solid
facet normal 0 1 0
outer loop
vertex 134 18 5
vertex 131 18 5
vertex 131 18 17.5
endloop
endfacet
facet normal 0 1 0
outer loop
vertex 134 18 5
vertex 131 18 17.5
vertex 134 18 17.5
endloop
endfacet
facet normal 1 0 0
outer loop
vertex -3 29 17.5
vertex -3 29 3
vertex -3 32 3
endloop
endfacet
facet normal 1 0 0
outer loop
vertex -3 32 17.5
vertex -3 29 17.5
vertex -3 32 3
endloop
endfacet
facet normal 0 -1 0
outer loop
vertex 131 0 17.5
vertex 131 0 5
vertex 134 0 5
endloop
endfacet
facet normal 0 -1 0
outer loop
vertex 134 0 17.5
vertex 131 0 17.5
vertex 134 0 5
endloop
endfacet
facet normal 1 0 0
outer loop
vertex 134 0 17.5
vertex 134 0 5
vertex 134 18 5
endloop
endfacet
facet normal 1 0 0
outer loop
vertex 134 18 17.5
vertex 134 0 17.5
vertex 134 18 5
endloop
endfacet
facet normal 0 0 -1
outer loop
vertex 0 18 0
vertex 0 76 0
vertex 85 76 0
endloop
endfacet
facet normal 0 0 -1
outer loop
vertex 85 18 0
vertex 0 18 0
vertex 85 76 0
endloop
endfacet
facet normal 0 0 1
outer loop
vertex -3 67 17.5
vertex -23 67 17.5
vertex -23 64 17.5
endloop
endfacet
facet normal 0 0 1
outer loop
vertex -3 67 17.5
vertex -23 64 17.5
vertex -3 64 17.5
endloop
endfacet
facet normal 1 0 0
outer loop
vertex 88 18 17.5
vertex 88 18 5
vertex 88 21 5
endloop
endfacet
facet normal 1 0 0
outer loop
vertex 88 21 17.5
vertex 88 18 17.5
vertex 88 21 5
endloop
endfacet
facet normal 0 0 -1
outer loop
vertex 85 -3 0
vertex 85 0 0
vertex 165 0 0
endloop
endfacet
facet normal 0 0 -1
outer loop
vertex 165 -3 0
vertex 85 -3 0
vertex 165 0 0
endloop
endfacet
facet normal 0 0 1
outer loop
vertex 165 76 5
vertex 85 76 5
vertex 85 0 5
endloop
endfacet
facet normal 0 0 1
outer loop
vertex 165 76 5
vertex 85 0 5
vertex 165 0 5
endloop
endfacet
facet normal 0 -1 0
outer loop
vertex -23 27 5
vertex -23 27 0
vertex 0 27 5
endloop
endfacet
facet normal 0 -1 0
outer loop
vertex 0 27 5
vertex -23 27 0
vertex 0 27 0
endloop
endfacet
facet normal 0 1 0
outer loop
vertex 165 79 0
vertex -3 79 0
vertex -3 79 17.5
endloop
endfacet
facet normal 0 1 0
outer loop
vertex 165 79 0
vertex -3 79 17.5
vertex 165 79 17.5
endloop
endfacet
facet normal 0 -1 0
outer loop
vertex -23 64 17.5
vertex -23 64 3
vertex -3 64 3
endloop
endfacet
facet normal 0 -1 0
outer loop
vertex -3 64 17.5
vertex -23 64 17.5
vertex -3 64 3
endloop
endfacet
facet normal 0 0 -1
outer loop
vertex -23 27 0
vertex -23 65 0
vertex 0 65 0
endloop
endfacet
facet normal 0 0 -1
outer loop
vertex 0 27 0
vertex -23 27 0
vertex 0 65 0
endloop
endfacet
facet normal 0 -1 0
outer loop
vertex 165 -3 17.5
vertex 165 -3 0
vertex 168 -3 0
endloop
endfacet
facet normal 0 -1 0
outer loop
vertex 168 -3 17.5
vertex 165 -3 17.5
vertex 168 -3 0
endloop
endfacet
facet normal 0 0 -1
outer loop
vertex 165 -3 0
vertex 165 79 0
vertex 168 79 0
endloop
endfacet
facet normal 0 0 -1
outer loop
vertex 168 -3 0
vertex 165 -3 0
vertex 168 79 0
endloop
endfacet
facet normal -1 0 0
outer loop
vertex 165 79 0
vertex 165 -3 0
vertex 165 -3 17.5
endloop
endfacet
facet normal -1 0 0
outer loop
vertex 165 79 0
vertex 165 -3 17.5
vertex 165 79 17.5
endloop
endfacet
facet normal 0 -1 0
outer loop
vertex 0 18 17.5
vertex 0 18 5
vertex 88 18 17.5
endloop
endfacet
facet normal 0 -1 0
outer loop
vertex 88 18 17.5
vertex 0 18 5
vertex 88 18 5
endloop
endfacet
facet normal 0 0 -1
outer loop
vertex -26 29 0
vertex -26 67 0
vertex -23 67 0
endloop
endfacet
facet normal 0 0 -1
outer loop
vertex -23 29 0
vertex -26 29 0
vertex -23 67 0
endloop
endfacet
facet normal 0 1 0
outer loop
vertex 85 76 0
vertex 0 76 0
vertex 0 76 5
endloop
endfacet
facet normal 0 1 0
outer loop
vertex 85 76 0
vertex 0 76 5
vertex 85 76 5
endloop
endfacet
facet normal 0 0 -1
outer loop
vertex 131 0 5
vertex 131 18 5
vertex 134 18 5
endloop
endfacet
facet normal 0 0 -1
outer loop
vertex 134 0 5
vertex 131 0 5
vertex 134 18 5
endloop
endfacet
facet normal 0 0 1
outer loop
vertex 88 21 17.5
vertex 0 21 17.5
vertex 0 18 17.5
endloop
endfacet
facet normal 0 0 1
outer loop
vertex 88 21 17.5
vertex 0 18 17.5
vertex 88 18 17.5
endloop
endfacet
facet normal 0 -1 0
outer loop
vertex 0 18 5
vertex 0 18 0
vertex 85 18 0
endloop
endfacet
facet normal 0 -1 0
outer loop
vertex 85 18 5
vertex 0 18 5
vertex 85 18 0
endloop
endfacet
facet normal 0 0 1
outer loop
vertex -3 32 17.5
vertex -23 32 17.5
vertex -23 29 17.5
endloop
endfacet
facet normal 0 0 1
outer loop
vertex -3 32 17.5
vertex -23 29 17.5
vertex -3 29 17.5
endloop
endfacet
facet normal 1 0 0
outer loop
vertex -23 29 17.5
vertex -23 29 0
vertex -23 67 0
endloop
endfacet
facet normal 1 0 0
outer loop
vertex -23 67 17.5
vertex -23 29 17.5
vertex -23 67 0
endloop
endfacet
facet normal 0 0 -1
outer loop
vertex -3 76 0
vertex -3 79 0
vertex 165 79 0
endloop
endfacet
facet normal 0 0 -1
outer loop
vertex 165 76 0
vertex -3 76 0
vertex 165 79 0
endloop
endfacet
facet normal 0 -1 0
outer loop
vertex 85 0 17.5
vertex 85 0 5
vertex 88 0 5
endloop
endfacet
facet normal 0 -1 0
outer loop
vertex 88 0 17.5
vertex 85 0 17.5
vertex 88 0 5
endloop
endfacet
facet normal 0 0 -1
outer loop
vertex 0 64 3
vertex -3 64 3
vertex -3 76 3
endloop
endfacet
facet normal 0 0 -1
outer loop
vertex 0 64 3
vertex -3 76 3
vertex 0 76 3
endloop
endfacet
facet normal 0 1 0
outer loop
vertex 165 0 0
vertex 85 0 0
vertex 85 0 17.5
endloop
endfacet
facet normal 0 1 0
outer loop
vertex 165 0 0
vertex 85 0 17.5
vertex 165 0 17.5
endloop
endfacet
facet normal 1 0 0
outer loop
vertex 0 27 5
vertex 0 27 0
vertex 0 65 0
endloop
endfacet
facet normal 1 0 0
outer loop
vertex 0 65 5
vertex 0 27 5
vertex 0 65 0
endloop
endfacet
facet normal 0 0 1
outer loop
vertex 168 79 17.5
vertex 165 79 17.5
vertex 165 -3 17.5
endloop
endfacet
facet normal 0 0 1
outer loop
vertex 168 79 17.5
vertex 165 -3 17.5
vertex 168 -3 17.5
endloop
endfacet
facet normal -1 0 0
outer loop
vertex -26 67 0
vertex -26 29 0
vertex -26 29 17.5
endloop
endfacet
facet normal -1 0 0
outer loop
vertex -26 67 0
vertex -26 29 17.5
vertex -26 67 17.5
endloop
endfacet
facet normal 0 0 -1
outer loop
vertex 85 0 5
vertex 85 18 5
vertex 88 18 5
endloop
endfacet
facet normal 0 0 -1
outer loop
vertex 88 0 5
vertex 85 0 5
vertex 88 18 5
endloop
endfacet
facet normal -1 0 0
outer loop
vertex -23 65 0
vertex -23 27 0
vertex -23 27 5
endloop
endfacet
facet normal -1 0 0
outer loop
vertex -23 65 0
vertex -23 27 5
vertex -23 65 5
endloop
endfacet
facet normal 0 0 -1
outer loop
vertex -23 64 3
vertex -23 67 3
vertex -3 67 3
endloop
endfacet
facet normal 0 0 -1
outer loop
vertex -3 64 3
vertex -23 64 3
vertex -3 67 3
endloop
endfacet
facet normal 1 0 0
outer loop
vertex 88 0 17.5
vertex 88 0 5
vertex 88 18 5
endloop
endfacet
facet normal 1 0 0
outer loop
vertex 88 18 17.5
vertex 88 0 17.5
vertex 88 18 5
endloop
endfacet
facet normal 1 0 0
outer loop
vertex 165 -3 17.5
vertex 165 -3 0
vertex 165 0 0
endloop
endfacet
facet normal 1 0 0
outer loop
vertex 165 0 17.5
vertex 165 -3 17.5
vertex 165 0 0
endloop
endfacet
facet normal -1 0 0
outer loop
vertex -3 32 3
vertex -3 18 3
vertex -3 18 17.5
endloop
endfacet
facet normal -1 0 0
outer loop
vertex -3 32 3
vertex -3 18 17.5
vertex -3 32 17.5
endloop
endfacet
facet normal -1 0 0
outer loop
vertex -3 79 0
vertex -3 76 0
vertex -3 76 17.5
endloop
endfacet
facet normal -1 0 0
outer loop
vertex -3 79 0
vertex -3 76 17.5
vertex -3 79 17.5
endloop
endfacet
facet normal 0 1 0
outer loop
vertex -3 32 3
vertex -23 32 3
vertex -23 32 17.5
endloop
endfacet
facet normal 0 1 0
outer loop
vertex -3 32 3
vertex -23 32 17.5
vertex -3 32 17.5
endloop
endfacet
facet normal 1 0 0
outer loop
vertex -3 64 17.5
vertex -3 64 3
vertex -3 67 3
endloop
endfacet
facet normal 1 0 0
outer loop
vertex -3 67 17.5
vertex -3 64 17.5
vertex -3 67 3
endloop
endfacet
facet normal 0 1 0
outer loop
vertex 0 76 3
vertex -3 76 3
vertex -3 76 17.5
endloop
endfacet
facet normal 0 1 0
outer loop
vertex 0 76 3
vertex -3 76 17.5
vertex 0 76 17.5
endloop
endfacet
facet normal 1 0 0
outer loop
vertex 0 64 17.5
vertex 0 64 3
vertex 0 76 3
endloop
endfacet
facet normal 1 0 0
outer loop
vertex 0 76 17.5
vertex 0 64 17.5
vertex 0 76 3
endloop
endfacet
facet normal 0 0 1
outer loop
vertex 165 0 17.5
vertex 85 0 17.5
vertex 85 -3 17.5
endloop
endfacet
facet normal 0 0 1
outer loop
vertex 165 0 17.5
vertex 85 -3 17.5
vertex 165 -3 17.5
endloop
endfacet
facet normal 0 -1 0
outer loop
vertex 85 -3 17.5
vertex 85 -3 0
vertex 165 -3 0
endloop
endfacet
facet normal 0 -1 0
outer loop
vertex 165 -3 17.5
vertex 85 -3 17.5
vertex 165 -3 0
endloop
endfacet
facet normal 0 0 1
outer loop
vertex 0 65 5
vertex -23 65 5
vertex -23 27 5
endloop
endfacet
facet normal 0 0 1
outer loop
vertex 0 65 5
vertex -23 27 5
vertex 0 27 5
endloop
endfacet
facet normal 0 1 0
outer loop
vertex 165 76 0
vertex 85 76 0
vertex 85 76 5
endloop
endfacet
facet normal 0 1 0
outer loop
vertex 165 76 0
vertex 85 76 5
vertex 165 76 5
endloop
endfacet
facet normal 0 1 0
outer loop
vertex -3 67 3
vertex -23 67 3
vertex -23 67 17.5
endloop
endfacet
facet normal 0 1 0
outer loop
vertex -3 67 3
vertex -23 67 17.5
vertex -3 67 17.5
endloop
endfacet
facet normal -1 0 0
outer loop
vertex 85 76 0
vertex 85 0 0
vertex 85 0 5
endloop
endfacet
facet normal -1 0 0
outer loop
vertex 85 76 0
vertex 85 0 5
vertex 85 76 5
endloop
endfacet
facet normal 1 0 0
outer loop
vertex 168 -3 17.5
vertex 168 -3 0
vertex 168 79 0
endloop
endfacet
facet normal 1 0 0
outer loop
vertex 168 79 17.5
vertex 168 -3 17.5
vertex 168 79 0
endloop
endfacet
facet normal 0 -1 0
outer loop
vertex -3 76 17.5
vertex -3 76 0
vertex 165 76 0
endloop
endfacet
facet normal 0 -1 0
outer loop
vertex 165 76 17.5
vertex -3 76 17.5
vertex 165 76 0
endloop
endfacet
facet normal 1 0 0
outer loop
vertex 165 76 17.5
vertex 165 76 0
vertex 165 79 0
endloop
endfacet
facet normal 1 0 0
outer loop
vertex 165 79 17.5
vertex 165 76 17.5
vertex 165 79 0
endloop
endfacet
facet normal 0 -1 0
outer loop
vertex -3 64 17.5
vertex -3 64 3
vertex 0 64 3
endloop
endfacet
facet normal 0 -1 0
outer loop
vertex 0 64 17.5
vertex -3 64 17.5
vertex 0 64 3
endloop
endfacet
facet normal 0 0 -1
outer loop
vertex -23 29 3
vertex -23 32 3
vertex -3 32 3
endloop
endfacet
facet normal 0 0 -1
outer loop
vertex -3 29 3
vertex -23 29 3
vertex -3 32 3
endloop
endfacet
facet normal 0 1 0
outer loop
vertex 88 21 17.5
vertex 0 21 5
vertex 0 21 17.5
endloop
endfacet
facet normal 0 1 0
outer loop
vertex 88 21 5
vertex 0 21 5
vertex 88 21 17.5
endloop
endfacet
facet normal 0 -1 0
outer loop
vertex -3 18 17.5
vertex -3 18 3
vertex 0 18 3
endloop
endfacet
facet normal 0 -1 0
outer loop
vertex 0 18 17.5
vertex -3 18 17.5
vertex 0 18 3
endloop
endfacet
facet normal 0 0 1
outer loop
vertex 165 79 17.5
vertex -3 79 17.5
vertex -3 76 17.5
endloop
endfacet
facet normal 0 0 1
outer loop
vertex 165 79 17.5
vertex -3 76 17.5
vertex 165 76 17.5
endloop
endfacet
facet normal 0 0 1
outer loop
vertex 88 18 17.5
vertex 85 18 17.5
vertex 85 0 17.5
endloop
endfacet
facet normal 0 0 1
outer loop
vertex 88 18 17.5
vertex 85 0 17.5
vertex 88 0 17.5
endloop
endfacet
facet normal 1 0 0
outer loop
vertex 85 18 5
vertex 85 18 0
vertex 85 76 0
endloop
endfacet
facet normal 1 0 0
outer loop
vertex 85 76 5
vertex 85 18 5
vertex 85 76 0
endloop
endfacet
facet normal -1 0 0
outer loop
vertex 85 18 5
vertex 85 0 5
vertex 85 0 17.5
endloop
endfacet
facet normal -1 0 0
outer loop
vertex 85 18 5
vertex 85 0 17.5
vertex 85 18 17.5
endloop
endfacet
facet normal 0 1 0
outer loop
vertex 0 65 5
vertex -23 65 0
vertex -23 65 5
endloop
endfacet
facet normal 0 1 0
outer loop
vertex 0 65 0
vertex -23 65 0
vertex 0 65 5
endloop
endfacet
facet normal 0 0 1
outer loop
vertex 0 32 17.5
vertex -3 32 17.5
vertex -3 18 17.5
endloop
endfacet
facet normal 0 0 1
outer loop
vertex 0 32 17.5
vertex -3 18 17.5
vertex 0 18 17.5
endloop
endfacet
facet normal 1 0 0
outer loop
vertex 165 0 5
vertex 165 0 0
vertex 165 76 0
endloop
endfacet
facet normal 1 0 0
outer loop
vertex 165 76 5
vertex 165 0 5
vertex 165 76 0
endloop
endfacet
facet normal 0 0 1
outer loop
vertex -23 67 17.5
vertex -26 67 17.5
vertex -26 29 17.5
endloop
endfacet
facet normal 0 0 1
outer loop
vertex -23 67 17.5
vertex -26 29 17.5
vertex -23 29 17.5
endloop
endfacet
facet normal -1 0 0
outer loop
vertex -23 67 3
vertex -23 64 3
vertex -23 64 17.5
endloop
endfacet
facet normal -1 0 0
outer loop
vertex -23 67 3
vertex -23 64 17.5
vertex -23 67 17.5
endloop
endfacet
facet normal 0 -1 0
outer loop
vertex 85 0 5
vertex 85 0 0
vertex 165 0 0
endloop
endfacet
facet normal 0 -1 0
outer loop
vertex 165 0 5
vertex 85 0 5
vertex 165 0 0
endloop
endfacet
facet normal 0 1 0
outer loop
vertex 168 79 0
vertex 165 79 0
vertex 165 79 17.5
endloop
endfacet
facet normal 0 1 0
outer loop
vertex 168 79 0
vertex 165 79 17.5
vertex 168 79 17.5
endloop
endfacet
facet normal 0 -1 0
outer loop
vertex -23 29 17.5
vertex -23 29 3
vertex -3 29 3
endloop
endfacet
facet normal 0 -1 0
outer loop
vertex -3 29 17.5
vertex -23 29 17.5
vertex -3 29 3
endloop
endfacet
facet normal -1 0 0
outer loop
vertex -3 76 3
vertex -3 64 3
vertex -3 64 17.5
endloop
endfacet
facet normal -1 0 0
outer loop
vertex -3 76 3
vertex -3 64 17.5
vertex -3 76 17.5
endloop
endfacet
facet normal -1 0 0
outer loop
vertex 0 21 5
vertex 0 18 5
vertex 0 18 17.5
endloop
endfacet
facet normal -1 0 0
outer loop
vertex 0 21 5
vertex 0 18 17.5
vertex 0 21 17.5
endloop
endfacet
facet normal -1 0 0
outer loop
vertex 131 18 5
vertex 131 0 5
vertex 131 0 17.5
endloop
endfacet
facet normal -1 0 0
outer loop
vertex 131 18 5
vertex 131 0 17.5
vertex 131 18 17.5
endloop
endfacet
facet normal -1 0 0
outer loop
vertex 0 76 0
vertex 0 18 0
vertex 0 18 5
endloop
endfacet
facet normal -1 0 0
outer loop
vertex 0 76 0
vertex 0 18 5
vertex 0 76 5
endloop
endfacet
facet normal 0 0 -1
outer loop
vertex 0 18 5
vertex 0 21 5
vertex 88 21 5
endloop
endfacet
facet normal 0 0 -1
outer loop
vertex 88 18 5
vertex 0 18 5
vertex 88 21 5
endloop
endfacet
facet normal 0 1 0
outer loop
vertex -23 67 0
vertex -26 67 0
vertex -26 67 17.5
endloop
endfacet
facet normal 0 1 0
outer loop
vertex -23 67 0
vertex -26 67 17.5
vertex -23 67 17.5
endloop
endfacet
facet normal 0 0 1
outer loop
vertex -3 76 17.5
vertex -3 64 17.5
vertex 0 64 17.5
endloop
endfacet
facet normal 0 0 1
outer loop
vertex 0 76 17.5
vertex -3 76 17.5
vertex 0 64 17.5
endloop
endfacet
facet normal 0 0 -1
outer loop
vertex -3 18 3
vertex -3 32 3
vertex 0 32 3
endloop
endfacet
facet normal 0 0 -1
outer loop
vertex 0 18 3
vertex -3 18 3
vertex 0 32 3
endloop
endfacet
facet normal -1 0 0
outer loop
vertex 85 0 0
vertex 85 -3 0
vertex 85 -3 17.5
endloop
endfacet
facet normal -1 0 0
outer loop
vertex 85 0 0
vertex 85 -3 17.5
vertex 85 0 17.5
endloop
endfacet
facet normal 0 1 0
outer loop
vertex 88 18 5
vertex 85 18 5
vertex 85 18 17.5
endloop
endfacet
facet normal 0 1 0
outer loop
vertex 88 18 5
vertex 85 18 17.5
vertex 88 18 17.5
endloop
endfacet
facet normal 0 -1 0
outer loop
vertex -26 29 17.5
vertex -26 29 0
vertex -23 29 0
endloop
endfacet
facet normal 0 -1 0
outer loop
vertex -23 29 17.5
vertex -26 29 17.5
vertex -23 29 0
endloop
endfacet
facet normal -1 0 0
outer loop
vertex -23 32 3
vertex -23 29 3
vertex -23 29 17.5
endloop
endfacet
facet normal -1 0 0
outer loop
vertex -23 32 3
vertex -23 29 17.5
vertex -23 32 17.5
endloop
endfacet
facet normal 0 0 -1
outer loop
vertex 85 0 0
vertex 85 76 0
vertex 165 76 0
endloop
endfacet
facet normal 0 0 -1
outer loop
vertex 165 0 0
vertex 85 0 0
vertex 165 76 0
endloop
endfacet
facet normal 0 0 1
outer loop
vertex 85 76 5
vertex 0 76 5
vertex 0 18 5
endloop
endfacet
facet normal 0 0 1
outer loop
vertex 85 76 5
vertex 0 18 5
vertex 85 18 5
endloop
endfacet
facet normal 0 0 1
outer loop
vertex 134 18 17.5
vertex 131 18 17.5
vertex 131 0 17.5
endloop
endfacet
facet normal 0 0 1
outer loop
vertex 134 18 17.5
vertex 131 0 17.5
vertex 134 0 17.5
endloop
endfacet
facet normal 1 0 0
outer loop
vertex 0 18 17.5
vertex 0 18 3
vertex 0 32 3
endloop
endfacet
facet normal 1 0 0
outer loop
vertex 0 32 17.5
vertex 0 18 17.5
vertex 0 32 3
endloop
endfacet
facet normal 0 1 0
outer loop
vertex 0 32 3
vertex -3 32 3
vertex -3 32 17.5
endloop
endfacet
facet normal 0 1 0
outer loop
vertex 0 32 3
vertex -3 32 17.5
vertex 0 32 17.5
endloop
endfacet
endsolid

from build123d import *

# Parameters (mm, degrees)
BOX_W        = 85
BOX_H        = 58
BOX_DEPTH    = 5
BOX001_W     = 3
BOX001_H     = 18
BOX001_DEPTH = 12.5
BOX004_W     = 80
BOX004_H     = 3
BOX004_DEPTH = 17.5
BOX005_W     = 168
BOX005_H     = 3
BOX005_DEPTH = 17.5
BOX006_W     = 3
BOX006_H     = 14
BOX006_DEPTH = 14.5
BOX007_W     = 3
BOX007_H     = 12
BOX007_DEPTH = 14.5
BOX008_W     = 3
BOX008_H     = 82
BOX008_DEPTH = 17.5
BOX009_W     = 88
BOX009_H     = 3
BOX009_DEPTH = 12.5
BOX010_W     = 3
BOX010_H     = 18
BOX010_DEPTH = 12.5
BOX011_W     = 23
BOX011_H     = 38
BOX011_DEPTH = 5
BOX012_W     = 20
BOX012_H     = 3
BOX012_DEPTH = 14.5
BOX013_W     = 20
BOX013_H     = 3
BOX013_DEPTH = 14.5
BOX014_W     = 3
BOX014_H     = 38
BOX014_DEPTH = 17.5
BOX015_W     = 80
BOX015_H     = 76
BOX015_DEPTH = 5


with BuildPart() as base:
    # Box → Box (new body)
    with BuildSketch(Plane(origin=(0, 18, 0), x_dir=(1, 0, 0), z_dir=(0, 0, 1))):
        with Locations((42.5, 29)):
            Rectangle(BOX_W, BOX_H)
    extrude(amount=BOX_DEPTH)


with BuildPart() as platform_support:
    # Box001 → Box001 (new body)
    with BuildSketch(Plane(origin=(85, 0, 5), x_dir=(1, 0, 0), z_dir=(0, 0, 1))):
        with Locations((1.5, 9)):
            Rectangle(BOX001_W, BOX001_H)
    extrude(amount=BOX001_DEPTH)


with BuildPart() as box004:
    # Box004 → Box004 (new body)
    with BuildSketch(Plane(origin=(85, -3, 0), x_dir=(1, 0, 0), z_dir=(0, 0, 1))):
        with Locations((40, 1.5)):
            Rectangle(BOX004_W, BOX004_H)
    extrude(amount=BOX004_DEPTH)


with BuildPart() as box005:
    # Box005 → Box005 (new body)
    with BuildSketch(Plane(origin=(-3, 76, 0), x_dir=(1, 0, 0), z_dir=(0, 0, 1))):
        with Locations((84, 1.5)):
            Rectangle(BOX005_W, BOX005_H)
    extrude(amount=BOX005_DEPTH)


with BuildPart() as box006:
    # Box006 → Box006 (new body)
    with BuildSketch(Plane(origin=(-3, 18, 3), x_dir=(1, 0, 0), z_dir=(0, 0, 1))):
        with Locations((1.5, 7)):
            Rectangle(BOX006_W, BOX006_H)
    extrude(amount=BOX006_DEPTH)


with BuildPart() as box007:
    # Box007 → Box007 (new body)
    with BuildSketch(Plane(origin=(-3, 64, 3), x_dir=(1, 0, 0), z_dir=(0, 0, 1))):
        with Locations((1.5, 6)):
            Rectangle(BOX007_W, BOX007_H)
    extrude(amount=BOX007_DEPTH)


with BuildPart() as box008:
    # Box008 → Box008 (new body)
    with BuildSketch(Plane(origin=(165, -3, 0), x_dir=(1, 0, 0), z_dir=(0, 0, 1))):
        with Locations((1.5, 41)):
            Rectangle(BOX008_W, BOX008_H)
    extrude(amount=BOX008_DEPTH)


with BuildPart() as platform_support001:
    # Box009 → Box009 (new body)
    with BuildSketch(Plane(origin=(0, 18, 5), x_dir=(1, 0, 0), z_dir=(0, 0, 1))):
        with Locations((44, 1.5)):
            Rectangle(BOX009_W, BOX009_H)
    extrude(amount=BOX009_DEPTH)


with BuildPart() as platform_support002:
    # Box010 → Box010 (new body)
    with BuildSketch(Plane(origin=(131, 0, 5), x_dir=(1, 0, 0), z_dir=(0, 0, 1))):
        with Locations((1.5, 9)):
            Rectangle(BOX010_W, BOX010_H)
    extrude(amount=BOX010_DEPTH)


with BuildPart() as box011:
    # Box011 → Box011 (new body)
    with BuildSketch(Plane(origin=(-23, 27, 0), x_dir=(1, 0, 0), z_dir=(0, 0, 1))):
        with Locations((11.5, 19)):
            Rectangle(BOX011_W, BOX011_H)
    extrude(amount=BOX011_DEPTH)


with BuildPart() as box012:
    # Box012 → Box012 (new body)
    with BuildSketch(Plane(origin=(-23, 64, 3), x_dir=(1, 0, 0), z_dir=(0, 0, 1))):
        with Locations((10, 1.5)):
            Rectangle(BOX012_W, BOX012_H)
    extrude(amount=BOX012_DEPTH)


with BuildPart() as box013:
    # Box013 → Box013 (new body)
    with BuildSketch(Plane(origin=(-23, 29, 3), x_dir=(1, 0, 0), z_dir=(0, 0, 1))):
        with Locations((10, 1.5)):
            Rectangle(BOX013_W, BOX013_H)
    extrude(amount=BOX013_DEPTH)


with BuildPart() as box014:
    # Box014 → Box014 (new body)
    with BuildSketch(Plane(origin=(-26, 29, 0), x_dir=(1, 0, 0), z_dir=(0, 0, 1))):
        with Locations((1.5, 19)):
            Rectangle(BOX014_W, BOX014_H)
    extrude(amount=BOX014_DEPTH)


with BuildPart() as base001:
    # Box015 → Box015 (new body)
    with BuildSketch(Plane(origin=(85, 0, 0), x_dir=(1, 0, 0), z_dir=(0, 0, 1))):
        with Locations((40, 38)):
            Rectangle(BOX015_W, BOX015_H)
    extrude(amount=BOX015_DEPTH)


solid = Compound([base.part, platform_support.part, box004.part, box005.part, box006.part, box007.part, box008.part, platform_support001.part, platform_support002.part, box011.part, box012.part, box013.part, box014.part, base001.part])
